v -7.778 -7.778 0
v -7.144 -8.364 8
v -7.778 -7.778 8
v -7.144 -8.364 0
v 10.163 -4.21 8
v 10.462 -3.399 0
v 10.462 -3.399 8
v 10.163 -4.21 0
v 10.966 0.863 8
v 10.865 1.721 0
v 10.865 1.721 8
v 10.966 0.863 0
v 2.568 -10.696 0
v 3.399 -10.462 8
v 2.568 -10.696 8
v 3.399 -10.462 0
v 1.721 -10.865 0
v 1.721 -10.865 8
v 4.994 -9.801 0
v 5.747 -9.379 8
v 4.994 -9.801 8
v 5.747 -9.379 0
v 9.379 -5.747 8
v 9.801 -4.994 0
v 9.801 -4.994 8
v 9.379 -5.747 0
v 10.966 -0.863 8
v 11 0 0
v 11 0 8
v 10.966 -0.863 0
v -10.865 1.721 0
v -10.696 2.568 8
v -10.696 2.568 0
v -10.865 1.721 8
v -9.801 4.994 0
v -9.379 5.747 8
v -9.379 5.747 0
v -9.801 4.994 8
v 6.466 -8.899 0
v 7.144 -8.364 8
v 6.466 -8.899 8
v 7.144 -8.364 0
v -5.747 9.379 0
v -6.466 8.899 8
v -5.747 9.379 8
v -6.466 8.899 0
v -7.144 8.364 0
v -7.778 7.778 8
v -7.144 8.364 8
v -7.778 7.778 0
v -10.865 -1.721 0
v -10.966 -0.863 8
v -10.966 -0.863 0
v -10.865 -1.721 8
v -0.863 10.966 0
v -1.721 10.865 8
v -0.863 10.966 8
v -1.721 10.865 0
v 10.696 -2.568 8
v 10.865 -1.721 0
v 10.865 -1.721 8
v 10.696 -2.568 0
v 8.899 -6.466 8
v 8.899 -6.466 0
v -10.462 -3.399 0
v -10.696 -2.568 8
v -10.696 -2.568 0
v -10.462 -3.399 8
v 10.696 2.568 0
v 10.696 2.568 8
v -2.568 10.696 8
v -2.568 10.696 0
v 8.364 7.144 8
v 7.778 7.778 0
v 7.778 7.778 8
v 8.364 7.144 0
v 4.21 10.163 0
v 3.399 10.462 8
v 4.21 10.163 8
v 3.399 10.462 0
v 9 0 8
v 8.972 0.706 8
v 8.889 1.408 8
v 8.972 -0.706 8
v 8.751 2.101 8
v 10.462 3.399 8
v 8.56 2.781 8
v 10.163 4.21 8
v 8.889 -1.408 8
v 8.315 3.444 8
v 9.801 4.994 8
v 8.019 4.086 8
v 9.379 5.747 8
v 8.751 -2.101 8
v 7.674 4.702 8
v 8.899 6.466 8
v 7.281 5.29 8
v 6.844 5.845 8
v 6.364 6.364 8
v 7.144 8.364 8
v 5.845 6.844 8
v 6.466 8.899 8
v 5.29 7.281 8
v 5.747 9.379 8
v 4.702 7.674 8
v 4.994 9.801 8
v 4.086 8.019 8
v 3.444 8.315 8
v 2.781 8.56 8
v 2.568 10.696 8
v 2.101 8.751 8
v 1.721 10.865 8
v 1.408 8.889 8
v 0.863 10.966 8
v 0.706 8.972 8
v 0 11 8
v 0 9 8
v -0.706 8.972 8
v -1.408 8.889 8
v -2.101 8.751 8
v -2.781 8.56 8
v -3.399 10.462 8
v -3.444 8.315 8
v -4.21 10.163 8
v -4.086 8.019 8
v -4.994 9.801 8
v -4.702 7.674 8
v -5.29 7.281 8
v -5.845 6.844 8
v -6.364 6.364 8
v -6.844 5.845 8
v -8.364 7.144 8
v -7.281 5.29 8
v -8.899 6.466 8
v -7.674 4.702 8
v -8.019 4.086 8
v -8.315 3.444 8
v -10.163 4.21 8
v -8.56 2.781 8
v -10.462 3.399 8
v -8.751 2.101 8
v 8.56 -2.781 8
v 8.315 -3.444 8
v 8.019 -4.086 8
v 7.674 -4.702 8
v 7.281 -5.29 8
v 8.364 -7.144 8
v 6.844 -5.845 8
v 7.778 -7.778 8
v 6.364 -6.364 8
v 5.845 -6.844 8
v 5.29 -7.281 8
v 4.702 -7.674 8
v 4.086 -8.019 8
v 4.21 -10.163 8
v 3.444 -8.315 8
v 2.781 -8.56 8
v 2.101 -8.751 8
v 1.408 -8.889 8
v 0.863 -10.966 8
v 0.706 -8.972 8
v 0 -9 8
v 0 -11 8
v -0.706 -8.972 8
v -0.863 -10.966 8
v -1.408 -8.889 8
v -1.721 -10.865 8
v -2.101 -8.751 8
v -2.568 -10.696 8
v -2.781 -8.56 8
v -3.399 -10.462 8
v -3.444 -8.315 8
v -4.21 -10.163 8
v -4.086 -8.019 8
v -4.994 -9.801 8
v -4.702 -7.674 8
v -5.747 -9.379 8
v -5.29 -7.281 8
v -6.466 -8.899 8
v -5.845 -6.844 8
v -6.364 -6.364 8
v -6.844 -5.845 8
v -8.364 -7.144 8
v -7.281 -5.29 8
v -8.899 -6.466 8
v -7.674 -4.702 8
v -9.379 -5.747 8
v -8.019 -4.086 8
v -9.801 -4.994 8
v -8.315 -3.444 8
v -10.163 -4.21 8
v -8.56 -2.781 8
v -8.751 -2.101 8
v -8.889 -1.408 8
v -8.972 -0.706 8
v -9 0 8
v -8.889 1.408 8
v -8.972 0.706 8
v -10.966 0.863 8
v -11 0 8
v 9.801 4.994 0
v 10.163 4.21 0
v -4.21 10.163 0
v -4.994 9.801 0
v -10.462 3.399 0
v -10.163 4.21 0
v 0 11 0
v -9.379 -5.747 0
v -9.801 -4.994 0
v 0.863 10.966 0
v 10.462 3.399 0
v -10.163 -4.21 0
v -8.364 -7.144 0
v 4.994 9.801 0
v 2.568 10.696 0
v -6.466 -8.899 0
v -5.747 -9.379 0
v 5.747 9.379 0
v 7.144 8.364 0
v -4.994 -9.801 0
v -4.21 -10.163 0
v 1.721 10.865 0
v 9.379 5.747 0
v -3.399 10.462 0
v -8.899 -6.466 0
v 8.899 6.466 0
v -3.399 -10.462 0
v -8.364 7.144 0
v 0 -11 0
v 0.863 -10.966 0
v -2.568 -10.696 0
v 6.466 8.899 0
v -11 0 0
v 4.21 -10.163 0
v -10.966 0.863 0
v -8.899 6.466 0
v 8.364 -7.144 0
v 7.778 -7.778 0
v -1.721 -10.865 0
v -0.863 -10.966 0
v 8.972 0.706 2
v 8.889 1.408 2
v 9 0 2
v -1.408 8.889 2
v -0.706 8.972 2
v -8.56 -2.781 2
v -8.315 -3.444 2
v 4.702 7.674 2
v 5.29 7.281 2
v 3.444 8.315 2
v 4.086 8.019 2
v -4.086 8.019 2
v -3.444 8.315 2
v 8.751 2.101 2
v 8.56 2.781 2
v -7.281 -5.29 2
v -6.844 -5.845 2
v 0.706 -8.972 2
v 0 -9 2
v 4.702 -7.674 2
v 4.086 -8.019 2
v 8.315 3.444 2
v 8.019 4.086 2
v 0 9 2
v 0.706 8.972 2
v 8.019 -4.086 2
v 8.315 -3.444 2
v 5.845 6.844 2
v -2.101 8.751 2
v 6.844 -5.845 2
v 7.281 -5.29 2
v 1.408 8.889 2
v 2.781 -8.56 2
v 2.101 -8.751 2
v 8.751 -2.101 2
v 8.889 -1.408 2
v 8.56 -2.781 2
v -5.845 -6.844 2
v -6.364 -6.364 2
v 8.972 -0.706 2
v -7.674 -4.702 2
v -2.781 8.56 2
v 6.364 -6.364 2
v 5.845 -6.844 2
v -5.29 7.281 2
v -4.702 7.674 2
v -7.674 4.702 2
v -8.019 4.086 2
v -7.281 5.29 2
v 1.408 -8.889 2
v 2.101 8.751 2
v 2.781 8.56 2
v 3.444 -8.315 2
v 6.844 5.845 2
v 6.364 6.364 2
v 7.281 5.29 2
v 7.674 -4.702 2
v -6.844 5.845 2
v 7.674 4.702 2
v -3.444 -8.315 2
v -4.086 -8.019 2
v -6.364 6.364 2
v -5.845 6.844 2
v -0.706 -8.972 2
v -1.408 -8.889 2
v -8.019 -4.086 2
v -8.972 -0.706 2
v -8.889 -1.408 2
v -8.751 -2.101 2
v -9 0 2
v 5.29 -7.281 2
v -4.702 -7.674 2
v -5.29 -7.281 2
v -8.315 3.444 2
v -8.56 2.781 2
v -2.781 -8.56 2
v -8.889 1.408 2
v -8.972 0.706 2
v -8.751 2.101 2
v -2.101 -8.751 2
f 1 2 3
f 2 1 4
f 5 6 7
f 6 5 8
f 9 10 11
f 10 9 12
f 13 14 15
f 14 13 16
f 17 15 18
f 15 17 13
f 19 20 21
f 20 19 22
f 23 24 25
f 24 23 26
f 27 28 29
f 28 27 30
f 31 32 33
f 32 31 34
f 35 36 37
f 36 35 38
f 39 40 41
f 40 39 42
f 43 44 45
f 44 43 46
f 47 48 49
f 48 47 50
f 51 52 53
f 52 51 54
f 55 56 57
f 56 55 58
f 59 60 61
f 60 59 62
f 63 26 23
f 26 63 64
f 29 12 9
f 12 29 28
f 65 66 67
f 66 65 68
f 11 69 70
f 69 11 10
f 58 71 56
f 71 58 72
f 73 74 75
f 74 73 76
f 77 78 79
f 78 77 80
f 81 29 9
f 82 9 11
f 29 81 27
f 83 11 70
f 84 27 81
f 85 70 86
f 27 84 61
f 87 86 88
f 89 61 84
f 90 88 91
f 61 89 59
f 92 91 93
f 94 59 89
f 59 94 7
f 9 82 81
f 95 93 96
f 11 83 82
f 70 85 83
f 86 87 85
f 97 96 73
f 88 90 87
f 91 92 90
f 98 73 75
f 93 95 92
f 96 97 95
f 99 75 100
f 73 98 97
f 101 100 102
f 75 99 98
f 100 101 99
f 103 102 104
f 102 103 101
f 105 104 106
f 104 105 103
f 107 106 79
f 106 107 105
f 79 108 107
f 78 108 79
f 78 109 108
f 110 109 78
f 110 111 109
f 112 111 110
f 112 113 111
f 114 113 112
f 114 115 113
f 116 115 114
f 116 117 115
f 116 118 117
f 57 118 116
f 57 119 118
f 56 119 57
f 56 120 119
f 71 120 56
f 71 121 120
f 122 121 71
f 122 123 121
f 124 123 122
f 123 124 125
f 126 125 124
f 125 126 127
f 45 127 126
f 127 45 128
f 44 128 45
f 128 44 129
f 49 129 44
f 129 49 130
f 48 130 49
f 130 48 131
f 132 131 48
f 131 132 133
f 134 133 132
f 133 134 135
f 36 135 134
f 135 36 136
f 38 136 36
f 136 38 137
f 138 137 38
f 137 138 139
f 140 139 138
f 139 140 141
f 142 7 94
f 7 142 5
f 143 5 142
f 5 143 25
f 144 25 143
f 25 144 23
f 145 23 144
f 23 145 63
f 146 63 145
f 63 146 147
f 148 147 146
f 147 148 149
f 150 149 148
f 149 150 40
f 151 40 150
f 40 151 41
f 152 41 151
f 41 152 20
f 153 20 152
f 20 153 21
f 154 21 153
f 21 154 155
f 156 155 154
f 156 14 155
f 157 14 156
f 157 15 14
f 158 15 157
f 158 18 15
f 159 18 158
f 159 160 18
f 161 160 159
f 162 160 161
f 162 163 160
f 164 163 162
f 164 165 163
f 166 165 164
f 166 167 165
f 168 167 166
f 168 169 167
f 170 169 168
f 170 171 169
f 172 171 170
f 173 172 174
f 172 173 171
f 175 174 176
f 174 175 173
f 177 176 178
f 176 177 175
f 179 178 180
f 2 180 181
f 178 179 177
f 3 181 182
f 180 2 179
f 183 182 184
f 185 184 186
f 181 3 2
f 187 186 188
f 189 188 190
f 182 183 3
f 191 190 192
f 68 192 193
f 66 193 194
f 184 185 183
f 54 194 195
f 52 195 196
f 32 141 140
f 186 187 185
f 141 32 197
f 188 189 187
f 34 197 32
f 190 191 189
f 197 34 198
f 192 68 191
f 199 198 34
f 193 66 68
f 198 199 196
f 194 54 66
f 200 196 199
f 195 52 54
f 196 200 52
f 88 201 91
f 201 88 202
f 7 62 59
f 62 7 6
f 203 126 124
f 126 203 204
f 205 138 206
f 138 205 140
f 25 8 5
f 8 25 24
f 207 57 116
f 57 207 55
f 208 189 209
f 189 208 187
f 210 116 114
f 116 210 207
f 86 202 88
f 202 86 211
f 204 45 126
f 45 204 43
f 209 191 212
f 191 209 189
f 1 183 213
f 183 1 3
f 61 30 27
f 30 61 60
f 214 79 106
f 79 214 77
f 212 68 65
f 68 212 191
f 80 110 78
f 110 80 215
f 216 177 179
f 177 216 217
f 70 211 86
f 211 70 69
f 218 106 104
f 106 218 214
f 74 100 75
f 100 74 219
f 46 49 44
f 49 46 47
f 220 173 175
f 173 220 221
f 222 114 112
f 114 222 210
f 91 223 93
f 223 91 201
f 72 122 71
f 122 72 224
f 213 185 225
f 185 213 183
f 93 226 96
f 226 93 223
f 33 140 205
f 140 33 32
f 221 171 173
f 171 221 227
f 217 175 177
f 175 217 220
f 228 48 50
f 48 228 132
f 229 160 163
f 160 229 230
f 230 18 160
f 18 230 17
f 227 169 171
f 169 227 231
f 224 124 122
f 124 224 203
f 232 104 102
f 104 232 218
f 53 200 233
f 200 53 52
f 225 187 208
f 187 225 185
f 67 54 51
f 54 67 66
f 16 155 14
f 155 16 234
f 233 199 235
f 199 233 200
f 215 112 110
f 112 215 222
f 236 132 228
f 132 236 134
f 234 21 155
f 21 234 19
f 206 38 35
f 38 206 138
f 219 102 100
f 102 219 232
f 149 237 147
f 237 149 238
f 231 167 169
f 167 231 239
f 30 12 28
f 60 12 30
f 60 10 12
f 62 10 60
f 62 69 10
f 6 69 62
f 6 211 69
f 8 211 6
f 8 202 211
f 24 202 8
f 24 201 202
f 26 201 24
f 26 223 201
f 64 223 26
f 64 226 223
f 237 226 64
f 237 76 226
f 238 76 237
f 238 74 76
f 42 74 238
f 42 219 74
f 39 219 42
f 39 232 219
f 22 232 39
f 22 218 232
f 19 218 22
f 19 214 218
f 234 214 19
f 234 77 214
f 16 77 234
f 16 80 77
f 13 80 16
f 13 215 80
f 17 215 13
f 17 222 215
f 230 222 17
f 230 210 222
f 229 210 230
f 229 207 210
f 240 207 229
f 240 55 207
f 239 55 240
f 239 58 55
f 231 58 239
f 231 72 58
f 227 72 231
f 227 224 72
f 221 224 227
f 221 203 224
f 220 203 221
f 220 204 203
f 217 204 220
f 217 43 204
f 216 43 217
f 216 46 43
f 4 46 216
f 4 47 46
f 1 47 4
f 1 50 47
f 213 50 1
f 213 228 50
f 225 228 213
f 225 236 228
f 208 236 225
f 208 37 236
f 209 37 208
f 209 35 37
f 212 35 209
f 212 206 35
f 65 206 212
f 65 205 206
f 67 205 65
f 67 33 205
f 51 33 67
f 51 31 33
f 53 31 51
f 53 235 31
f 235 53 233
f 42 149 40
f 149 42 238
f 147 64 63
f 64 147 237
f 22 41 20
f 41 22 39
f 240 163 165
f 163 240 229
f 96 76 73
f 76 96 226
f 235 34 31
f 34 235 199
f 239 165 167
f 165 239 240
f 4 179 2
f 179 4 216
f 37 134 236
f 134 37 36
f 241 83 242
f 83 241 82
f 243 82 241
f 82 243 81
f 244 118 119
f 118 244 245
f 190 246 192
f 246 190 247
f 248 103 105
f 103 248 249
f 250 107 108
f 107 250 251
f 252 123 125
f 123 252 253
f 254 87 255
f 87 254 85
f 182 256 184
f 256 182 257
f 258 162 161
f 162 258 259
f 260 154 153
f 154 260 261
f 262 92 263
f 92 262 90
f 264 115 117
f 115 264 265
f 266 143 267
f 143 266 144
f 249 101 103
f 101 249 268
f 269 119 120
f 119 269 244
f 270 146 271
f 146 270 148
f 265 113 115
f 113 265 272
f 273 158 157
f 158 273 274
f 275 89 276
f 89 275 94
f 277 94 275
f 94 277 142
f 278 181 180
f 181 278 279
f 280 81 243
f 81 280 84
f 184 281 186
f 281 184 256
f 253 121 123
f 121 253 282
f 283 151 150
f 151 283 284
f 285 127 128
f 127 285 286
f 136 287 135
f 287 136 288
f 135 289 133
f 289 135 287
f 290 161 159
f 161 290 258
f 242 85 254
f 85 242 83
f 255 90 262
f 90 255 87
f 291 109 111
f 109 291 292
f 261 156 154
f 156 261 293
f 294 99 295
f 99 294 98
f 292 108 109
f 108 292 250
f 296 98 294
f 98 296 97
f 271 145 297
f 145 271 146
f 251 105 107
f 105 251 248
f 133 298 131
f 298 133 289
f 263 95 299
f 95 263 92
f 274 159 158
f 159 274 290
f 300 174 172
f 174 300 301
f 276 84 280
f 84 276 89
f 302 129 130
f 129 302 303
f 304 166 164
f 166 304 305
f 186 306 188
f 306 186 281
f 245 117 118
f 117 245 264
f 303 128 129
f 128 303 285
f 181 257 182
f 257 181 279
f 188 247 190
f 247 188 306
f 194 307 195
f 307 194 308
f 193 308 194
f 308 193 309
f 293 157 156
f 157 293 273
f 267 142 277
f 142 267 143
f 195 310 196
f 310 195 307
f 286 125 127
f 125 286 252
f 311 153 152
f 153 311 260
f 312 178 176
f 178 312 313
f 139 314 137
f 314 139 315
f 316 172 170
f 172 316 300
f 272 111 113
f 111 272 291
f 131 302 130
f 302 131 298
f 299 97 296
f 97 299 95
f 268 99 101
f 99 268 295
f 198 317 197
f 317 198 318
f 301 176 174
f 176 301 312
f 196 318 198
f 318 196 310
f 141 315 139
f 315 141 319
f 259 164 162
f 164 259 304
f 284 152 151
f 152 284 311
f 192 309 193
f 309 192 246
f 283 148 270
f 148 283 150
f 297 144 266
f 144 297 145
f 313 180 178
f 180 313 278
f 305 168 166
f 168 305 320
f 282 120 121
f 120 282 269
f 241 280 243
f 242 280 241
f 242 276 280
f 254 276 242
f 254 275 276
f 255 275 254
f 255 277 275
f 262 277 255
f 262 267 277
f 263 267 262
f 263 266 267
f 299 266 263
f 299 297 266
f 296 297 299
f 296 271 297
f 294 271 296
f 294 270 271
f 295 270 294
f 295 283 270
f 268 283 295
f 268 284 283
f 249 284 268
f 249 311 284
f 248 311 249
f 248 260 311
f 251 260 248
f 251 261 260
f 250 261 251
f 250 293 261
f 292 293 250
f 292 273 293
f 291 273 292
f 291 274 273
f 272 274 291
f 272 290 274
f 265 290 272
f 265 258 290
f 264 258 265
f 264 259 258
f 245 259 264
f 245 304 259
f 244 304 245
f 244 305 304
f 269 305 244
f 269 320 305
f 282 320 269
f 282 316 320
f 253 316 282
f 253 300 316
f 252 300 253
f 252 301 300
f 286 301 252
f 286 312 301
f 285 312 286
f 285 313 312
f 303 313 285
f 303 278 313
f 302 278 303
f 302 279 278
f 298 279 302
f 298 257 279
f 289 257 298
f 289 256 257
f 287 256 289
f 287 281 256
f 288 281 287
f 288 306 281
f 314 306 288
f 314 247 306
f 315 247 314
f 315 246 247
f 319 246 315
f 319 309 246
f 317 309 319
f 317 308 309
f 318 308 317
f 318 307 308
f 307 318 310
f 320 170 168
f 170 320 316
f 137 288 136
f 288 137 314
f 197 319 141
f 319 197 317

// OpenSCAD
/* [Global] */

// This is the diameter (in mm) of the extsting feet on the appliance. If there's any question, err on the side of a slightly larger value so that the riser fits around the foot.
FOOT_DIAMETER_MM = 18;

// This is how tall (in mm) the existing feet on the appliance are. We'll create a channel in the riser that fits the feet. If there's any question, err on the side of a smaller value, creating a smaller channel for the feet to fit in.
FOOT_HEIGHT_MM = 6;

// Rise height (in mm). This is how much you want to lift the appliance.
RISE_HEIGHT_MM = 2;

// I sometimes find that printing one object at a time yields better results on my printer. You can select if you want the output to have one foot in the file or all four.
FOOT_COUNT = 1; // [1:Single, 4:Four]

/* [Hidden] */
WALL_SIZE = 2;
CYLINDER_RADIUS = FOOT_DIAMETER_MM / 2 + WALL_SIZE;
CYLINDER_HEIGHT = FOOT_HEIGHT_MM + RISE_HEIGHT_MM;
INNER_CYLINDER_RADIUS = FOOT_DIAMETER_MM / 2;
FOUR_UP_DISTANCE = 0.5;
DETAIL = 80;

module riser()
{
    difference()
    {
        cylinder(r = CYLINDER_RADIUS, h = CYLINDER_HEIGHT, $fn = DETAIL);
        translate(v = [0, 0, CYLINDER_HEIGHT - FOOT_HEIGHT_MM])
            cylinder(r = INNER_CYLINDER_RADIUS, h = FOOT_HEIGHT_MM + 1, $fn = DETAIL);
    }
}

if (1 == FOOT_COUNT)
{
    // Single
    riser();
} else {
    // Multiple
    translate(v = [CYLINDER_RADIUS + FOUR_UP_DISTANCE, CYLINDER_RADIUS + FOUR_UP_DISTANCE, 0])
        riser();
    translate(v = [CYLINDER_RADIUS + FOUR_UP_DISTANCE, -1 * CYLINDER_RADIUS - FOUR_UP_DISTANCE, 0])
        riser();
    translate(v = [-1 * CYLINDER_RADIUS - FOUR_UP_DISTANCE, CYLINDER_RADIUS + FOUR_UP_DISTANCE, 0])
        riser();
    translate(v = [-1 * CYLINDER_RADIUS - FOUR_UP_DISTANCE, -1 * CYLINDER_RADIUS - FOUR_UP_DISTANCE, 0])
        riser();
    }
